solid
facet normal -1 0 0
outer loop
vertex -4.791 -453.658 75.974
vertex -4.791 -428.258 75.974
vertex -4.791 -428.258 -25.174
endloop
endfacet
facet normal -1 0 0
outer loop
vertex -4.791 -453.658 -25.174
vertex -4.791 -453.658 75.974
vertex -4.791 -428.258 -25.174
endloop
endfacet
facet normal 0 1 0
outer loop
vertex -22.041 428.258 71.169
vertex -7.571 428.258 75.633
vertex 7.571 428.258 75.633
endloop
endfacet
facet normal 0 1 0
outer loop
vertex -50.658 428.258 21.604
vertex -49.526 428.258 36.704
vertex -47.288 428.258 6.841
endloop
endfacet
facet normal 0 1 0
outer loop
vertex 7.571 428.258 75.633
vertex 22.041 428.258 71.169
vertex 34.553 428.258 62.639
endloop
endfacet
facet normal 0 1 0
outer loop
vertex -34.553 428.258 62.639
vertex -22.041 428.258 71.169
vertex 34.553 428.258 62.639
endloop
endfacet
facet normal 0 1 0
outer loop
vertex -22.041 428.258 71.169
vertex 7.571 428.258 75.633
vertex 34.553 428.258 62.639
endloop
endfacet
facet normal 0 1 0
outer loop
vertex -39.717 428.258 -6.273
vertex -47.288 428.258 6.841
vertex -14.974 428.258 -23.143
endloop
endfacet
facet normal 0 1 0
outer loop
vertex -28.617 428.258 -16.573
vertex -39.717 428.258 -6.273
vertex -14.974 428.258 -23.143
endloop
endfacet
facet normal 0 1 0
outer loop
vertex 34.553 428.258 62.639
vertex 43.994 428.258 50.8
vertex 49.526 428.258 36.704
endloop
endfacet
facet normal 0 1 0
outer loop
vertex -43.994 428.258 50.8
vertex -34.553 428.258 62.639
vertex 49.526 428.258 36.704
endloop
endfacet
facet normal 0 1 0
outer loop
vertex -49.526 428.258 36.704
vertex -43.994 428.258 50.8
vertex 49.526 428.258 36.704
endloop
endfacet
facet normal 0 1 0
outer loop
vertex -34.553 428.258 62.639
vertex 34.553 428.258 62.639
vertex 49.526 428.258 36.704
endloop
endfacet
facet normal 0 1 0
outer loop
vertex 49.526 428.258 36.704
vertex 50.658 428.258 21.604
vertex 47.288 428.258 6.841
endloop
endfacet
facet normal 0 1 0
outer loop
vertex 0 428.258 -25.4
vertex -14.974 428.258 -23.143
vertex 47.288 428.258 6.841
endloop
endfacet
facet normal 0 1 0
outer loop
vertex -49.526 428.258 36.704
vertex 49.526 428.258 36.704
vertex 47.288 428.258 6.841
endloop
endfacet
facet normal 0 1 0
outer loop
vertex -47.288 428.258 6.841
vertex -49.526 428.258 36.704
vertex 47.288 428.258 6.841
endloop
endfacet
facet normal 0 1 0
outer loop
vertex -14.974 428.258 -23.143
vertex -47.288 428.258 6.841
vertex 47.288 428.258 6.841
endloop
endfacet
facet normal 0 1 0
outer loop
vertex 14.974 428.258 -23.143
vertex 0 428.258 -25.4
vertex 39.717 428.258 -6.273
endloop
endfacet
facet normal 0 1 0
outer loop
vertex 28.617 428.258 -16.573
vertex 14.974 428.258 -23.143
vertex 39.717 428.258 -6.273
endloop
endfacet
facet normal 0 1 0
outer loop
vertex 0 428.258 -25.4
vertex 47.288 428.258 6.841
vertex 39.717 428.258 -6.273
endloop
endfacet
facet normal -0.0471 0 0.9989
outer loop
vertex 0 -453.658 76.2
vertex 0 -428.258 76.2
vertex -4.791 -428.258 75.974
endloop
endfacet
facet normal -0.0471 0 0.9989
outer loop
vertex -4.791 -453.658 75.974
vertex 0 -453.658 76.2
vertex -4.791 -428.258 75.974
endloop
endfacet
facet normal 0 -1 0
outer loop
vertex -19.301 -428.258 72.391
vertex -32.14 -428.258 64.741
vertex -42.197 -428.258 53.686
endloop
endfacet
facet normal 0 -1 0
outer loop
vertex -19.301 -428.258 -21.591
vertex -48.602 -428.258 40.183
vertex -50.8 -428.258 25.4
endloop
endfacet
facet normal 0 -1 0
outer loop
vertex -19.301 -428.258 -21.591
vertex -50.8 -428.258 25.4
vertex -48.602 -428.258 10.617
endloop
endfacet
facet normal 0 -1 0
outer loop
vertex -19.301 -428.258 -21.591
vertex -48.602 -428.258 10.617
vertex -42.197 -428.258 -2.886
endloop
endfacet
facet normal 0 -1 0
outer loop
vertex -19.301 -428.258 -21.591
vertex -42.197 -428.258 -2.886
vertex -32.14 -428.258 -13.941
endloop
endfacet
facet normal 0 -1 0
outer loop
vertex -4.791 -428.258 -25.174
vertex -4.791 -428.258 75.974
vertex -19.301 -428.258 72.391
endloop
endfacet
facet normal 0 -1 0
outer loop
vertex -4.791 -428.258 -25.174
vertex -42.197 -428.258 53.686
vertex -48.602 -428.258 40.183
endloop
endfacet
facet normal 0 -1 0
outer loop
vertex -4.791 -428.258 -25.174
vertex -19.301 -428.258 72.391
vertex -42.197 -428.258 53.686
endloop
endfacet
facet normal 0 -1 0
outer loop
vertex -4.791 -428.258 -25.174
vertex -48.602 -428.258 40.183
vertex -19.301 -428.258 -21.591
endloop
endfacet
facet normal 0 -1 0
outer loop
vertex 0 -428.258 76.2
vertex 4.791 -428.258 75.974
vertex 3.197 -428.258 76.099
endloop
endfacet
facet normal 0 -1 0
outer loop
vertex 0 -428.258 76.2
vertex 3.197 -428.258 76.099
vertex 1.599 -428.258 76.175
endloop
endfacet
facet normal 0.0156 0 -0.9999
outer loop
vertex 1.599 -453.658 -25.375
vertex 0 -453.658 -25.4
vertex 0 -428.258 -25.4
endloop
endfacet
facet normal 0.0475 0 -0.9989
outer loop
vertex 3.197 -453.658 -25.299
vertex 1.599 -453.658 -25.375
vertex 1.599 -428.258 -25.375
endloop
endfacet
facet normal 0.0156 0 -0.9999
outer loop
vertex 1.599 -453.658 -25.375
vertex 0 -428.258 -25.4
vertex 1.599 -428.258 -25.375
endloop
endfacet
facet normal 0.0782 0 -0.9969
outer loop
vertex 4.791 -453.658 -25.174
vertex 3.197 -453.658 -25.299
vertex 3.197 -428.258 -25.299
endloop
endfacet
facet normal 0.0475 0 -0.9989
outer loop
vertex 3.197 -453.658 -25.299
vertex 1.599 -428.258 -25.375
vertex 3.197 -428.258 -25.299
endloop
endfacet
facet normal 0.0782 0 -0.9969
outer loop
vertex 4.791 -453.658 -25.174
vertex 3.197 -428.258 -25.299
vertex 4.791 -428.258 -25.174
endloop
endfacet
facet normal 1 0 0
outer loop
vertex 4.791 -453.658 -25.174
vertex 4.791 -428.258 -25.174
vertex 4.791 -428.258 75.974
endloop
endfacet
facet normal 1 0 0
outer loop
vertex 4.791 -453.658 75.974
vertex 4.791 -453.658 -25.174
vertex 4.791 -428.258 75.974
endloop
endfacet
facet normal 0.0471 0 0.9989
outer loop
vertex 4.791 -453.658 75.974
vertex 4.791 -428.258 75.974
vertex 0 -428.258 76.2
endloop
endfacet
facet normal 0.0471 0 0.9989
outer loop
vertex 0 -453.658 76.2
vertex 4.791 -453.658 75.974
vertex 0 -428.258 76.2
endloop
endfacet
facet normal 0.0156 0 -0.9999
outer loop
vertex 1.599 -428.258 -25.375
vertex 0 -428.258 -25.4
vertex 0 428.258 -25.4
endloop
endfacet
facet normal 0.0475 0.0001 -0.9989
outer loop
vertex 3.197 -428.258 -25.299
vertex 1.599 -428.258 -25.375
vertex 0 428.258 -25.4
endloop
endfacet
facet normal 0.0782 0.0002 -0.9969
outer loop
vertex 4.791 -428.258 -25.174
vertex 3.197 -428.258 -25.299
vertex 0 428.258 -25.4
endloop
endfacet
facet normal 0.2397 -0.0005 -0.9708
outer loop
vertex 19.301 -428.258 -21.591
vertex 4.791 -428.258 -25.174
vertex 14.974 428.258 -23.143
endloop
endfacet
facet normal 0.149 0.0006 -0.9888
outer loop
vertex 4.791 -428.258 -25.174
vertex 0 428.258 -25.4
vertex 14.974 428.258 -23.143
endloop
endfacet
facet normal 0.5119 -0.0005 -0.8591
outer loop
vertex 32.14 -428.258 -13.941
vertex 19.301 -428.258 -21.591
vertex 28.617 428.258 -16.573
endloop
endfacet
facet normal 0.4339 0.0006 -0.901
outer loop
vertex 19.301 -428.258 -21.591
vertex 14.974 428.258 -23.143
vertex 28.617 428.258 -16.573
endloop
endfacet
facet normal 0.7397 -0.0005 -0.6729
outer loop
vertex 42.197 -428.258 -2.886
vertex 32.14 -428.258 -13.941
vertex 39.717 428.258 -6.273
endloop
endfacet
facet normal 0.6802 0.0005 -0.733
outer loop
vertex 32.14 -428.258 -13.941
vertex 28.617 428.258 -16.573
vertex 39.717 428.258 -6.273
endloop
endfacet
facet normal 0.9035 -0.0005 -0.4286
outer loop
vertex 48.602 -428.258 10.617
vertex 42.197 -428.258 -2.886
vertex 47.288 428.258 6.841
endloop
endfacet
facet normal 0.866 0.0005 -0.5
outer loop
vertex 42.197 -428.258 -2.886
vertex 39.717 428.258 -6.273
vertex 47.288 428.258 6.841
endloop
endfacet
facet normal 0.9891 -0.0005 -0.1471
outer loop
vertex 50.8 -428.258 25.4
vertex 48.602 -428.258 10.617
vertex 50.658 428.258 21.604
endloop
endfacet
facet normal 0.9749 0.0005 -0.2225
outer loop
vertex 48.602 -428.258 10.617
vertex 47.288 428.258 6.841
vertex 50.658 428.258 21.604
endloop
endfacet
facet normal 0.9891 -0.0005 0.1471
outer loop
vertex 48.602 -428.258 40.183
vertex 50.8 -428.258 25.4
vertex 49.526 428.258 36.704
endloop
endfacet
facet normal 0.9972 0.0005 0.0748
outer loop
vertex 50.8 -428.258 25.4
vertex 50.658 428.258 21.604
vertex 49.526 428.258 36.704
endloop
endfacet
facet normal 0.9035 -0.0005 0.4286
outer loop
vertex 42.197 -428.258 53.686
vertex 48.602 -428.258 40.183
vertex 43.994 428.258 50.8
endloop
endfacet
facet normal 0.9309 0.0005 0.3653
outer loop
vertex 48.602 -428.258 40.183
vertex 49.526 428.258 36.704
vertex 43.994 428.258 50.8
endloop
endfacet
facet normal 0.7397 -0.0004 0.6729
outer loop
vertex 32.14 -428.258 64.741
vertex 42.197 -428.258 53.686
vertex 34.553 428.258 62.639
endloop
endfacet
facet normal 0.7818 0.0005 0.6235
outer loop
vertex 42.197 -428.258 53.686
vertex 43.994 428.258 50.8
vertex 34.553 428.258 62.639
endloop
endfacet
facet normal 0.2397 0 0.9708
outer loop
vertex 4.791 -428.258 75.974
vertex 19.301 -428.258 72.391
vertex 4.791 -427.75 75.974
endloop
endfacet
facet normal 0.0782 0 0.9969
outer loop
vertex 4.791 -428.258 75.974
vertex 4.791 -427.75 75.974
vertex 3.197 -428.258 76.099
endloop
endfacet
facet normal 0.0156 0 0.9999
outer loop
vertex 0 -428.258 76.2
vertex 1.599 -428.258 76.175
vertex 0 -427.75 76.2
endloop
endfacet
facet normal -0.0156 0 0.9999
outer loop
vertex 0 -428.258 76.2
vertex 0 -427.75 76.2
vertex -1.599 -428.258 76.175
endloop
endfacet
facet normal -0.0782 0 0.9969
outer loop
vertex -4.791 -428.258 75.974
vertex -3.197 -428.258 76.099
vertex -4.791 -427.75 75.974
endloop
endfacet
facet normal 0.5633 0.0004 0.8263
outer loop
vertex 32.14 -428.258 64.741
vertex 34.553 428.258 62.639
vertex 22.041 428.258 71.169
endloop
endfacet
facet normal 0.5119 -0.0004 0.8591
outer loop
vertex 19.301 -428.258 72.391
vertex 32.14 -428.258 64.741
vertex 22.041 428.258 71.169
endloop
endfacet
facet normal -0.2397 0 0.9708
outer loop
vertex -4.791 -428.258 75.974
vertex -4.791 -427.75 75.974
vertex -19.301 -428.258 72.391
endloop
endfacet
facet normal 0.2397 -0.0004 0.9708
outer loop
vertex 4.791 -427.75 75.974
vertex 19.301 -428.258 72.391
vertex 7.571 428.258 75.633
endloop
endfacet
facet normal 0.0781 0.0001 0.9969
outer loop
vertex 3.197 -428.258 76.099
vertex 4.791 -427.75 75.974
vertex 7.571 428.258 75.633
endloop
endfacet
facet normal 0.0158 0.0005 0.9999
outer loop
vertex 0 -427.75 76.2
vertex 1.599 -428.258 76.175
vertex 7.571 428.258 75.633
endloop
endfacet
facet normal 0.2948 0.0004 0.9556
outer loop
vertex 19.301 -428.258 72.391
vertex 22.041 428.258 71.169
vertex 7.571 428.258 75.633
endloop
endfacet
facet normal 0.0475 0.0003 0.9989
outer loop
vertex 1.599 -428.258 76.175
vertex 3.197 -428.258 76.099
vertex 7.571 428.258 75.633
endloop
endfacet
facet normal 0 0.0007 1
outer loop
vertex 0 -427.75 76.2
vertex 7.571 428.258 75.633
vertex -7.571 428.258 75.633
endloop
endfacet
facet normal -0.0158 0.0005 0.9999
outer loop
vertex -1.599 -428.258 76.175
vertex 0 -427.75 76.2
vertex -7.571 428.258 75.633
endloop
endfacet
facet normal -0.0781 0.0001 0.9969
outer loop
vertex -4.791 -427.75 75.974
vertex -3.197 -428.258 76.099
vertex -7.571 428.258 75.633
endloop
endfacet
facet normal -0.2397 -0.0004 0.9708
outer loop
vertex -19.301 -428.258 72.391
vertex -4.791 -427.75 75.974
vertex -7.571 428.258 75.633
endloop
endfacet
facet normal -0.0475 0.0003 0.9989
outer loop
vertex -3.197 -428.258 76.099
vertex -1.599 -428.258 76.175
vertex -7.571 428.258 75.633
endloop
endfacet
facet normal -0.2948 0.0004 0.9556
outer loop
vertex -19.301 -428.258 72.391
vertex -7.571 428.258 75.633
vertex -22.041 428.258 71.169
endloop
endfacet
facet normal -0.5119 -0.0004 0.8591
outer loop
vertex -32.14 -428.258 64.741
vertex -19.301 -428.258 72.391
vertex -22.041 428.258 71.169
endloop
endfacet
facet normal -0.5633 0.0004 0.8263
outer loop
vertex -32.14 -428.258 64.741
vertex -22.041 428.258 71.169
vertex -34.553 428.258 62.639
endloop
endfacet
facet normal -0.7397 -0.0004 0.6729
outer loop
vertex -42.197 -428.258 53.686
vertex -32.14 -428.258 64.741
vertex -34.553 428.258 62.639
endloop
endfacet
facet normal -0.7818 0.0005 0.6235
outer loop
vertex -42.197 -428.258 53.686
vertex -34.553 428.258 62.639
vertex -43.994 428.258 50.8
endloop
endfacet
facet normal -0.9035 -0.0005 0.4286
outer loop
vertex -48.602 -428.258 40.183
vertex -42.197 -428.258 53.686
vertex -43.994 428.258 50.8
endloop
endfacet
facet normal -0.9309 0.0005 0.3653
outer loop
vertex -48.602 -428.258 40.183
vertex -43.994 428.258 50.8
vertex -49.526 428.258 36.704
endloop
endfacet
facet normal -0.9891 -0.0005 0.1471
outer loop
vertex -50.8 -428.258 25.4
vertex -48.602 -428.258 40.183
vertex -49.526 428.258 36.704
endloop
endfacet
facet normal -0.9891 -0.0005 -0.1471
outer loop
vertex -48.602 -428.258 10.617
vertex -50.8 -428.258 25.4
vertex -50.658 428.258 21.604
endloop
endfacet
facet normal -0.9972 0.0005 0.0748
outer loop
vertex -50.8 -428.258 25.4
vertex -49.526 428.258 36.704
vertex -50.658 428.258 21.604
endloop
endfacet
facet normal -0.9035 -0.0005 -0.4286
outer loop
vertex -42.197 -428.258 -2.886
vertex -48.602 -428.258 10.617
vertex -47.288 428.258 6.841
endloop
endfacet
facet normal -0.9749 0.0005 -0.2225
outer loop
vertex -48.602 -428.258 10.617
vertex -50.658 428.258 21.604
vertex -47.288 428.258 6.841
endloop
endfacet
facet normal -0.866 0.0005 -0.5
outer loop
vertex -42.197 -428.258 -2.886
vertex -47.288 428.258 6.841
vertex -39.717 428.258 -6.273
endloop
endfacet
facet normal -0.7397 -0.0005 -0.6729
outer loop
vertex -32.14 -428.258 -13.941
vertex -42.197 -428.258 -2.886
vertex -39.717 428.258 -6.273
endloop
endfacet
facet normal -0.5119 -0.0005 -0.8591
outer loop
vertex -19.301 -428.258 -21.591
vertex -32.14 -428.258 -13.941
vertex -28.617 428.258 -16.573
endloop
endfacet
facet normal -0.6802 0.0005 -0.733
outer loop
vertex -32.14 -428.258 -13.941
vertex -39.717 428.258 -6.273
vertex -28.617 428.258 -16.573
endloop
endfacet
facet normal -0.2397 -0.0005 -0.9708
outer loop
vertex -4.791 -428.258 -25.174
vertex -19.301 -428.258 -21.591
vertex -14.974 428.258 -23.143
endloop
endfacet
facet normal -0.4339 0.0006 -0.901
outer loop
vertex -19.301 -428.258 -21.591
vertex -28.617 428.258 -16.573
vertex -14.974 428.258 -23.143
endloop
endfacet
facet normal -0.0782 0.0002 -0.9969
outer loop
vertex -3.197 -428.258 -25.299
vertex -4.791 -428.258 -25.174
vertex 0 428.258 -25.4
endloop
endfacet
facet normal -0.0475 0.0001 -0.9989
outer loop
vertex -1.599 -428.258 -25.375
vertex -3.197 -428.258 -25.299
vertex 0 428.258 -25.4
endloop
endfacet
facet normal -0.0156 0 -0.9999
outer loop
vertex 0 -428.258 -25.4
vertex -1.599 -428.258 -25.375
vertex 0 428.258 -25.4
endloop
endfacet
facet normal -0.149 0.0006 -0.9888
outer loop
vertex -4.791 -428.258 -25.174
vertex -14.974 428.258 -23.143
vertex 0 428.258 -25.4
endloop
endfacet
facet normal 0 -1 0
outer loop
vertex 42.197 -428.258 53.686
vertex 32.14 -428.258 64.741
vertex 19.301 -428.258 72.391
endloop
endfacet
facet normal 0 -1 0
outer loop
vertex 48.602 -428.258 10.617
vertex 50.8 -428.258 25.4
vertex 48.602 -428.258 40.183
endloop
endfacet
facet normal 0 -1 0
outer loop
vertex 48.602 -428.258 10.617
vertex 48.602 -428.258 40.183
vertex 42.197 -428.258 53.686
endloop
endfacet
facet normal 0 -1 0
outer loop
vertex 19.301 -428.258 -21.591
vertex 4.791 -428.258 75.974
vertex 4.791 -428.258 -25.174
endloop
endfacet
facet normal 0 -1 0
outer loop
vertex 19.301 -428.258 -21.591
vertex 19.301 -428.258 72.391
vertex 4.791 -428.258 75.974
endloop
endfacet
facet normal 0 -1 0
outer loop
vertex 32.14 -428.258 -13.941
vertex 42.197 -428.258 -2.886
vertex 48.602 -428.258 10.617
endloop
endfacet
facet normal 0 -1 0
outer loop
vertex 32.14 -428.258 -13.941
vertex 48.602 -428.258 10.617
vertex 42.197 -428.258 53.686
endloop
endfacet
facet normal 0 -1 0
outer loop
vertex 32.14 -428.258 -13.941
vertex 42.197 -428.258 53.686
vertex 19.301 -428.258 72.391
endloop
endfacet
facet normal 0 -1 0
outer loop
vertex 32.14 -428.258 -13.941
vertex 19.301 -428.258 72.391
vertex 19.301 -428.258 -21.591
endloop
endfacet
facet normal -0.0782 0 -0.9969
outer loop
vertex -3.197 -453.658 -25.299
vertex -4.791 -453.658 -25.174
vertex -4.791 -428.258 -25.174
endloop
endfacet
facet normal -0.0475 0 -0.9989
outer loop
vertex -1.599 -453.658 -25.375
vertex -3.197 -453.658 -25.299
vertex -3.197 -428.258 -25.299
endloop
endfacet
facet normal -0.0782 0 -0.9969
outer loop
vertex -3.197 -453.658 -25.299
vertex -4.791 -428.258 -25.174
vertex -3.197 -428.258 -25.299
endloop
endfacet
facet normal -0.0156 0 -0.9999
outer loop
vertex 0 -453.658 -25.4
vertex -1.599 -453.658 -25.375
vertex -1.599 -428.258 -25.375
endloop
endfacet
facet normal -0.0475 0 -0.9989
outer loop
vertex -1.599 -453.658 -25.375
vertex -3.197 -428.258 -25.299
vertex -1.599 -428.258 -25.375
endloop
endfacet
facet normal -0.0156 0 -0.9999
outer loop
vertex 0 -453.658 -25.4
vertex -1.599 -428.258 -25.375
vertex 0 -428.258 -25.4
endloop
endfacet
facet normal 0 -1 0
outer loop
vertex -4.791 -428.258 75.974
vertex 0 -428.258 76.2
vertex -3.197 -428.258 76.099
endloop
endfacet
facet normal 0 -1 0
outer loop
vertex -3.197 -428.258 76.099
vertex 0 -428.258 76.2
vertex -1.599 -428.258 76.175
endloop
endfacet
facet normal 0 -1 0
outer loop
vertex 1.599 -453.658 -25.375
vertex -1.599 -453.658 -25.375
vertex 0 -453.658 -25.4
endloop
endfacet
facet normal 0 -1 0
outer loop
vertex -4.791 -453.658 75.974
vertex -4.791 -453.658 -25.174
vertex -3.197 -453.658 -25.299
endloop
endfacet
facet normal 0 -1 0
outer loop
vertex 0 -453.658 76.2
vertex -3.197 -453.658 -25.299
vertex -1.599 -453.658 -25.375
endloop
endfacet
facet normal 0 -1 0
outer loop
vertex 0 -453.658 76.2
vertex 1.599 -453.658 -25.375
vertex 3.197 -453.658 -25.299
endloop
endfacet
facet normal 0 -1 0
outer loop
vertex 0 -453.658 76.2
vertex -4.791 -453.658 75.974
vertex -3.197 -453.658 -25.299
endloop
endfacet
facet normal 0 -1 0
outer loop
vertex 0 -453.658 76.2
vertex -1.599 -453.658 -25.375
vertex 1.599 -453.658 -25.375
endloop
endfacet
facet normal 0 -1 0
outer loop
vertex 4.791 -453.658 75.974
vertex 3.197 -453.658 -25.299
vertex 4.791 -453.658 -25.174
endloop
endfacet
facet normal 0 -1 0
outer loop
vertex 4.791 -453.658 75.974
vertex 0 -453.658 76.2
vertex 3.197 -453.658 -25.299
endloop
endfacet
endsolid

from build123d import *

# Parameters (mm, degrees)
F0_W     = 856.515822627
F0_H     = 50.8
F3_DEPTH = 25.4
F4_DEPTH = 0.508


with BuildPart() as f1:
    # F0 (on Right) → F1 (revolve)
    with BuildSketch(Plane.YZ):
        Rectangle(F0_W, F0_H)
    revolve(axis=Axis((0, 0, 25.4), (0, -1, 0)))

    # F2 (on face) → F3 (join)
    with BuildSketch(Plane.XZ.offset(428.2579113135)):
        with BuildLine():
            Line((-4.7912972498, 75.9735451661), (-4.7912972498, -25.1735451661))
            ThreePointArc((-4.7912972498, -25.1735451661), (-2.3983229103, -25.3433547099), (0, -25.4))
            ThreePointArc((0, -25.4), (2.3983229103, -25.3433547099), (4.7912972498, -25.1735451661))
            Line((4.7912972498, -25.1735451661), (4.7912972498, 75.9735451661))
            Line((4.7912972498, 75.9735451661), (0, 76.2))
            Line((0, 76.2), (-4.7912972498, 75.9735451661))
        make_face()
    extrude(amount=F3_DEPTH)

    # F2 (on face) → F4 (join)
    with BuildSketch(Plane.XZ.offset(428.2579113135)):
        with BuildLine():
            Line((-4.7912972498, 75.9735451661), (-4.7912972498, -25.1735451661))
            ThreePointArc((-4.7912972498, -25.1735451661), (-2.3983229103, -25.3433547099), (0, -25.4))
            ThreePointArc((0, -25.4), (2.3983229103, -25.3433547099), (4.7912972498, -25.1735451661))
            Line((4.7912972498, -25.1735451661), (4.7912972498, 75.9735451661))
            Line((4.7912972498, 75.9735451661), (0, 76.2))
            Line((0, 76.2), (-4.7912972498, 75.9735451661))
        make_face()
    extrude(amount=-F4_DEPTH)


solid = f1.part
